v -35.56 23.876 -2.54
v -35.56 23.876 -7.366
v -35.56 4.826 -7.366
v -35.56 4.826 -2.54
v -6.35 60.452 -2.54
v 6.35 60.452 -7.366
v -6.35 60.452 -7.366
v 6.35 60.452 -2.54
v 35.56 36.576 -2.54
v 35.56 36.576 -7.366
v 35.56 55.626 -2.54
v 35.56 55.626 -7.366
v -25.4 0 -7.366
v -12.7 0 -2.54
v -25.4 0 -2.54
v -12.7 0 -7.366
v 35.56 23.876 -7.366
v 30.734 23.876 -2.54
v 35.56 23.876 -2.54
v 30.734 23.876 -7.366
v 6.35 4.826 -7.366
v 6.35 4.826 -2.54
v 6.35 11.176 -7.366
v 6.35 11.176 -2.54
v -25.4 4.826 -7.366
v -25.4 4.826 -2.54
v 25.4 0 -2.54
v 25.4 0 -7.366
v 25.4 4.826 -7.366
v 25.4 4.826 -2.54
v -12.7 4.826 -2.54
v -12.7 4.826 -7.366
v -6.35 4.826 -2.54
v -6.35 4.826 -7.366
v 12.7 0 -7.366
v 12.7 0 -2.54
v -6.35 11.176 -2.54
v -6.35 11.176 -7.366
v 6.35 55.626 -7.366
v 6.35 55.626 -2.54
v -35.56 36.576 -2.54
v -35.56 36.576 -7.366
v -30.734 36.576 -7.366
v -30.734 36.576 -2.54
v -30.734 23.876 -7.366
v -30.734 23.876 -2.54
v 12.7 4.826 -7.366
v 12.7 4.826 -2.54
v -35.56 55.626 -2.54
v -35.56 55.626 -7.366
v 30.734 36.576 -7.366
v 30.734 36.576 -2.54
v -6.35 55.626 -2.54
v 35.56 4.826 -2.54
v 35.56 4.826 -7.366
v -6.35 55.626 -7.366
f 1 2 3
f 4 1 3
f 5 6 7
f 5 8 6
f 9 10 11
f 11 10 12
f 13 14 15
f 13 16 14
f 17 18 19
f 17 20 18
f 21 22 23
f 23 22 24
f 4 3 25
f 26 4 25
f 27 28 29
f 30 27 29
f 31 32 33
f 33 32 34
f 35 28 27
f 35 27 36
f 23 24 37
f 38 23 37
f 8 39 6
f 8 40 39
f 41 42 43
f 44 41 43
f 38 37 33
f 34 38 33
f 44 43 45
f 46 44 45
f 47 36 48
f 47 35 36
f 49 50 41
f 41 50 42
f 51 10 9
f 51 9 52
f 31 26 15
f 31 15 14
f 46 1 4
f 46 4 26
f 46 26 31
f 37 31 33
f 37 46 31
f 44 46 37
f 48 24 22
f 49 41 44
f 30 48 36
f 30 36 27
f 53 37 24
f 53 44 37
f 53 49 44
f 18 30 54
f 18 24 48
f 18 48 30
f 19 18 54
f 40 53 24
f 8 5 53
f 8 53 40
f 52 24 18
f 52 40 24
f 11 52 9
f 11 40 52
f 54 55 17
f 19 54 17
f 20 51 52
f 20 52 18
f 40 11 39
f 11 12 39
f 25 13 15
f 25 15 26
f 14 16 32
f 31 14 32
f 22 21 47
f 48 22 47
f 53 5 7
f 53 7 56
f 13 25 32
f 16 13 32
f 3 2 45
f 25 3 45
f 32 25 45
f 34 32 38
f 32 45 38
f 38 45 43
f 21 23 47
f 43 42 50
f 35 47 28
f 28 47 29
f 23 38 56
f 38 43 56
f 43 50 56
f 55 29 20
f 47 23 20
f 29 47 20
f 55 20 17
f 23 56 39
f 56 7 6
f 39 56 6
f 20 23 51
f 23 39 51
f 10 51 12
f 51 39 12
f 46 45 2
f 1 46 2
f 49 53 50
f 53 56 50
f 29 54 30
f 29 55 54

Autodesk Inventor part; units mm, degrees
ref_plane "YZ Plane" through (0, 0, 0) normal (1, 0, 0) x (0, 1, 0)
ref_plane "XZ Plane" through (0, 0, 0) normal (0, 1, 0) x (-1, 0, 0)
ref_plane "XY Plane" through (0, 0, 0) normal (0, 0, 1) x (1, 0, 0)
sketch "Sketch1" plane through (0, 0, 0) normal (0, 0, 1) x (1, 0, 0)
  line L0 (-38.1, 0) -> (38.1, 0) projected
  line L1 (38.1, 0) -> (38.1, 4.826) projected
  line L2 (-38.1, 4.826) -> (38.1, 4.826) projected
  line L3 (-38.1, 0) -> (-38.1, 4.826) projected
  line L4 (-25.4, 0) -> (-12.7, 0) projected
  line L5 (-25.4, 0) -> (-25.4, 4.826) projected
  line L6 (-12.7, 4.826) -> (-25.4, 4.826) projected
  line L7 (-12.7, 0) -> (-12.7, 4.826) projected
  line L8 (12.7, 0) -> (25.4, 0) projected
  line L9 (12.7, 0) -> (12.7, 4.826) projected
  line L10 (25.4, 4.826) -> (12.7, 4.826) projected
  line L11 (25.4, 0) -> (25.4, 4.826) projected
  point P0 (0, 0)
ref_plane "Work Plane1" through (-12.7, 0, -7.366) normal (0, 0, 1) x (1, 0, 0)
sketch "Sketch2" plane through (-12.7, 0, -7.366) normal (0, 0, 1) x (1, 0, 0)
  line L0 (0, 0) -> (-12.7, 0) projected
  line L1 (0, 0) -> (0, 4.826) projected
  line L2 (-12.7, 4.826) -> (0, 4.826) projected
  line L3 (-12.7, 0) -> (-12.7, 4.826) projected
  line L4 (-12.7, 0) -> (0, 0)
  line L5 (0, 0) -> (0, 4.826)
  line L6 (-12.7, 4.826) -> (-12.7, 0)
  line L7 (38.1, 0) -> (25.4, 0) projected
  line L8 (38.1, 0) -> (38.1, 4.826) projected
  line L9 (25.4, 4.826) -> (38.1, 4.826) projected
  line L10 (25.4, 0) -> (25.4, 4.826) projected
  line L11 (25.4, 0) -> (38.1, 0)
  line L12 (38.1, 0) -> (38.1, 4.826)
  line L13 (25.4, 4.826) -> (25.4, 0)
  line L14 (-18.034, 0) -> (-22.86, 0) projected
  line L15 (-18.034, 0) -> (-18.034, 4.826) projected
  line L16 (-22.86, 4.826) -> (-18.034, 4.826) projected
  line L17 (-22.86, 0) -> (-22.86, 4.826) projected
  line L18 (43.434, 0) -> (48.26, 0) projected
  line L19 (43.434, 0) -> (43.434, 4.826) projected
  line L20 (48.26, 4.826) -> (43.434, 4.826) projected
  line L21 (48.26, 0) -> (48.26, 4.826) projected
  line L22 (48.26, 55.626) -> (-22.86, 55.626)
  line L23 (-22.86, 36.576) -> (-18.034, 36.576)
  line L24 (-18.034, 36.576) -> (-18.034, 23.876)
  line L25 (-18.034, 23.876) -> (-22.86, 23.876)
  line L26 (48.26, 36.576) -> (43.434, 36.576)
  line L27 (43.434, 36.576) -> (43.434, 23.876)
  line L28 (43.434, 23.876) -> (48.26, 23.876)
  line L29 (-22.86, 55.626) -> (-22.86, 36.576)
  line L30 (-22.86, 23.876) -> (-22.86, 4.826)
  line L31 (48.26, 4.826) -> (48.26, 23.876)
  line L32 (48.26, 36.576) -> (48.26, 55.626)
  line L33 (-22.86, 4.826) -> (-12.7, 4.826)
  line L34 (0, 4.826) -> (25.4, 4.826)
  line L35 (38.1, 4.826) -> (48.26, 4.826)
  point P0 (12.7, 0)
  dimension "d0" = 50.8
  dimension "d2" = 12.7
  dimension "d5" = 4.826
  dimension "d18" = 19.05
  dimension "d19" = 19.05
extrude "Extrusion1" add sketch "Sketch2" along normal blind 4.826 contours L0 L3 L2 L1 | L2 L33 L16 L30 L25 L24 L23 L29 L22 L32 L26 L27 L28 L31 L20 L35 L9 L34 | L9 L8 L7 L10
sketch "Sketch3" plane through (-12.7, 0, -2.54) normal (0, 0, 1) x (1, 0, 0)
  line L0 (48.26, 55.626) -> (-22.86, 55.626) projected
  line L1 (-22.86, 55.626) -> (-22.86, 36.576) projected
  line L2 (48.26, 55.626) -> (-22.86, 55.626) projected
  line L3 (6.35, 55.626) -> (19.05, 55.626)
  line L4 (19.05, 55.626) -> (19.05, 60.452)
  line L5 (19.05, 60.452) -> (6.35, 60.452)
  line L6 (6.35, 60.452) -> (6.35, 55.626)
  point P0 (12.7, 0)
  dimension "d8" = 12.7
  dimension "d9" = 4.826
  dimension "d10" = 29.21
extrude "Extrusion2" add sketch "Sketch3" against normal blind 4.826
sketch "Sketch4" plane through (-12.7, 0, -2.54) normal (0, 0, 1) x (1, 0, 0)
  line L0 (0, 4.826) -> (25.4, 4.826) projected
  line L1 (6.35, 4.826) -> (19.05, 4.826)
  line L2 (19.05, 4.826) -> (19.05, 11.176)
  line L3 (19.05, 11.176) -> (6.35, 11.176)
  line L4 (6.35, 11.176) -> (6.35, 4.826)
  line L5 (48.26, 4.826) -> (48.26, 23.876) projected
  point P0 (12.7, 0)
  dimension "d13" = 12.7
  dimension "d14" = 6.35
  dimension "d15" = 29.21
extrude "Extrusion3" cut sketch "Sketch4" against normal blind 4.826
properties part number "sideR"
